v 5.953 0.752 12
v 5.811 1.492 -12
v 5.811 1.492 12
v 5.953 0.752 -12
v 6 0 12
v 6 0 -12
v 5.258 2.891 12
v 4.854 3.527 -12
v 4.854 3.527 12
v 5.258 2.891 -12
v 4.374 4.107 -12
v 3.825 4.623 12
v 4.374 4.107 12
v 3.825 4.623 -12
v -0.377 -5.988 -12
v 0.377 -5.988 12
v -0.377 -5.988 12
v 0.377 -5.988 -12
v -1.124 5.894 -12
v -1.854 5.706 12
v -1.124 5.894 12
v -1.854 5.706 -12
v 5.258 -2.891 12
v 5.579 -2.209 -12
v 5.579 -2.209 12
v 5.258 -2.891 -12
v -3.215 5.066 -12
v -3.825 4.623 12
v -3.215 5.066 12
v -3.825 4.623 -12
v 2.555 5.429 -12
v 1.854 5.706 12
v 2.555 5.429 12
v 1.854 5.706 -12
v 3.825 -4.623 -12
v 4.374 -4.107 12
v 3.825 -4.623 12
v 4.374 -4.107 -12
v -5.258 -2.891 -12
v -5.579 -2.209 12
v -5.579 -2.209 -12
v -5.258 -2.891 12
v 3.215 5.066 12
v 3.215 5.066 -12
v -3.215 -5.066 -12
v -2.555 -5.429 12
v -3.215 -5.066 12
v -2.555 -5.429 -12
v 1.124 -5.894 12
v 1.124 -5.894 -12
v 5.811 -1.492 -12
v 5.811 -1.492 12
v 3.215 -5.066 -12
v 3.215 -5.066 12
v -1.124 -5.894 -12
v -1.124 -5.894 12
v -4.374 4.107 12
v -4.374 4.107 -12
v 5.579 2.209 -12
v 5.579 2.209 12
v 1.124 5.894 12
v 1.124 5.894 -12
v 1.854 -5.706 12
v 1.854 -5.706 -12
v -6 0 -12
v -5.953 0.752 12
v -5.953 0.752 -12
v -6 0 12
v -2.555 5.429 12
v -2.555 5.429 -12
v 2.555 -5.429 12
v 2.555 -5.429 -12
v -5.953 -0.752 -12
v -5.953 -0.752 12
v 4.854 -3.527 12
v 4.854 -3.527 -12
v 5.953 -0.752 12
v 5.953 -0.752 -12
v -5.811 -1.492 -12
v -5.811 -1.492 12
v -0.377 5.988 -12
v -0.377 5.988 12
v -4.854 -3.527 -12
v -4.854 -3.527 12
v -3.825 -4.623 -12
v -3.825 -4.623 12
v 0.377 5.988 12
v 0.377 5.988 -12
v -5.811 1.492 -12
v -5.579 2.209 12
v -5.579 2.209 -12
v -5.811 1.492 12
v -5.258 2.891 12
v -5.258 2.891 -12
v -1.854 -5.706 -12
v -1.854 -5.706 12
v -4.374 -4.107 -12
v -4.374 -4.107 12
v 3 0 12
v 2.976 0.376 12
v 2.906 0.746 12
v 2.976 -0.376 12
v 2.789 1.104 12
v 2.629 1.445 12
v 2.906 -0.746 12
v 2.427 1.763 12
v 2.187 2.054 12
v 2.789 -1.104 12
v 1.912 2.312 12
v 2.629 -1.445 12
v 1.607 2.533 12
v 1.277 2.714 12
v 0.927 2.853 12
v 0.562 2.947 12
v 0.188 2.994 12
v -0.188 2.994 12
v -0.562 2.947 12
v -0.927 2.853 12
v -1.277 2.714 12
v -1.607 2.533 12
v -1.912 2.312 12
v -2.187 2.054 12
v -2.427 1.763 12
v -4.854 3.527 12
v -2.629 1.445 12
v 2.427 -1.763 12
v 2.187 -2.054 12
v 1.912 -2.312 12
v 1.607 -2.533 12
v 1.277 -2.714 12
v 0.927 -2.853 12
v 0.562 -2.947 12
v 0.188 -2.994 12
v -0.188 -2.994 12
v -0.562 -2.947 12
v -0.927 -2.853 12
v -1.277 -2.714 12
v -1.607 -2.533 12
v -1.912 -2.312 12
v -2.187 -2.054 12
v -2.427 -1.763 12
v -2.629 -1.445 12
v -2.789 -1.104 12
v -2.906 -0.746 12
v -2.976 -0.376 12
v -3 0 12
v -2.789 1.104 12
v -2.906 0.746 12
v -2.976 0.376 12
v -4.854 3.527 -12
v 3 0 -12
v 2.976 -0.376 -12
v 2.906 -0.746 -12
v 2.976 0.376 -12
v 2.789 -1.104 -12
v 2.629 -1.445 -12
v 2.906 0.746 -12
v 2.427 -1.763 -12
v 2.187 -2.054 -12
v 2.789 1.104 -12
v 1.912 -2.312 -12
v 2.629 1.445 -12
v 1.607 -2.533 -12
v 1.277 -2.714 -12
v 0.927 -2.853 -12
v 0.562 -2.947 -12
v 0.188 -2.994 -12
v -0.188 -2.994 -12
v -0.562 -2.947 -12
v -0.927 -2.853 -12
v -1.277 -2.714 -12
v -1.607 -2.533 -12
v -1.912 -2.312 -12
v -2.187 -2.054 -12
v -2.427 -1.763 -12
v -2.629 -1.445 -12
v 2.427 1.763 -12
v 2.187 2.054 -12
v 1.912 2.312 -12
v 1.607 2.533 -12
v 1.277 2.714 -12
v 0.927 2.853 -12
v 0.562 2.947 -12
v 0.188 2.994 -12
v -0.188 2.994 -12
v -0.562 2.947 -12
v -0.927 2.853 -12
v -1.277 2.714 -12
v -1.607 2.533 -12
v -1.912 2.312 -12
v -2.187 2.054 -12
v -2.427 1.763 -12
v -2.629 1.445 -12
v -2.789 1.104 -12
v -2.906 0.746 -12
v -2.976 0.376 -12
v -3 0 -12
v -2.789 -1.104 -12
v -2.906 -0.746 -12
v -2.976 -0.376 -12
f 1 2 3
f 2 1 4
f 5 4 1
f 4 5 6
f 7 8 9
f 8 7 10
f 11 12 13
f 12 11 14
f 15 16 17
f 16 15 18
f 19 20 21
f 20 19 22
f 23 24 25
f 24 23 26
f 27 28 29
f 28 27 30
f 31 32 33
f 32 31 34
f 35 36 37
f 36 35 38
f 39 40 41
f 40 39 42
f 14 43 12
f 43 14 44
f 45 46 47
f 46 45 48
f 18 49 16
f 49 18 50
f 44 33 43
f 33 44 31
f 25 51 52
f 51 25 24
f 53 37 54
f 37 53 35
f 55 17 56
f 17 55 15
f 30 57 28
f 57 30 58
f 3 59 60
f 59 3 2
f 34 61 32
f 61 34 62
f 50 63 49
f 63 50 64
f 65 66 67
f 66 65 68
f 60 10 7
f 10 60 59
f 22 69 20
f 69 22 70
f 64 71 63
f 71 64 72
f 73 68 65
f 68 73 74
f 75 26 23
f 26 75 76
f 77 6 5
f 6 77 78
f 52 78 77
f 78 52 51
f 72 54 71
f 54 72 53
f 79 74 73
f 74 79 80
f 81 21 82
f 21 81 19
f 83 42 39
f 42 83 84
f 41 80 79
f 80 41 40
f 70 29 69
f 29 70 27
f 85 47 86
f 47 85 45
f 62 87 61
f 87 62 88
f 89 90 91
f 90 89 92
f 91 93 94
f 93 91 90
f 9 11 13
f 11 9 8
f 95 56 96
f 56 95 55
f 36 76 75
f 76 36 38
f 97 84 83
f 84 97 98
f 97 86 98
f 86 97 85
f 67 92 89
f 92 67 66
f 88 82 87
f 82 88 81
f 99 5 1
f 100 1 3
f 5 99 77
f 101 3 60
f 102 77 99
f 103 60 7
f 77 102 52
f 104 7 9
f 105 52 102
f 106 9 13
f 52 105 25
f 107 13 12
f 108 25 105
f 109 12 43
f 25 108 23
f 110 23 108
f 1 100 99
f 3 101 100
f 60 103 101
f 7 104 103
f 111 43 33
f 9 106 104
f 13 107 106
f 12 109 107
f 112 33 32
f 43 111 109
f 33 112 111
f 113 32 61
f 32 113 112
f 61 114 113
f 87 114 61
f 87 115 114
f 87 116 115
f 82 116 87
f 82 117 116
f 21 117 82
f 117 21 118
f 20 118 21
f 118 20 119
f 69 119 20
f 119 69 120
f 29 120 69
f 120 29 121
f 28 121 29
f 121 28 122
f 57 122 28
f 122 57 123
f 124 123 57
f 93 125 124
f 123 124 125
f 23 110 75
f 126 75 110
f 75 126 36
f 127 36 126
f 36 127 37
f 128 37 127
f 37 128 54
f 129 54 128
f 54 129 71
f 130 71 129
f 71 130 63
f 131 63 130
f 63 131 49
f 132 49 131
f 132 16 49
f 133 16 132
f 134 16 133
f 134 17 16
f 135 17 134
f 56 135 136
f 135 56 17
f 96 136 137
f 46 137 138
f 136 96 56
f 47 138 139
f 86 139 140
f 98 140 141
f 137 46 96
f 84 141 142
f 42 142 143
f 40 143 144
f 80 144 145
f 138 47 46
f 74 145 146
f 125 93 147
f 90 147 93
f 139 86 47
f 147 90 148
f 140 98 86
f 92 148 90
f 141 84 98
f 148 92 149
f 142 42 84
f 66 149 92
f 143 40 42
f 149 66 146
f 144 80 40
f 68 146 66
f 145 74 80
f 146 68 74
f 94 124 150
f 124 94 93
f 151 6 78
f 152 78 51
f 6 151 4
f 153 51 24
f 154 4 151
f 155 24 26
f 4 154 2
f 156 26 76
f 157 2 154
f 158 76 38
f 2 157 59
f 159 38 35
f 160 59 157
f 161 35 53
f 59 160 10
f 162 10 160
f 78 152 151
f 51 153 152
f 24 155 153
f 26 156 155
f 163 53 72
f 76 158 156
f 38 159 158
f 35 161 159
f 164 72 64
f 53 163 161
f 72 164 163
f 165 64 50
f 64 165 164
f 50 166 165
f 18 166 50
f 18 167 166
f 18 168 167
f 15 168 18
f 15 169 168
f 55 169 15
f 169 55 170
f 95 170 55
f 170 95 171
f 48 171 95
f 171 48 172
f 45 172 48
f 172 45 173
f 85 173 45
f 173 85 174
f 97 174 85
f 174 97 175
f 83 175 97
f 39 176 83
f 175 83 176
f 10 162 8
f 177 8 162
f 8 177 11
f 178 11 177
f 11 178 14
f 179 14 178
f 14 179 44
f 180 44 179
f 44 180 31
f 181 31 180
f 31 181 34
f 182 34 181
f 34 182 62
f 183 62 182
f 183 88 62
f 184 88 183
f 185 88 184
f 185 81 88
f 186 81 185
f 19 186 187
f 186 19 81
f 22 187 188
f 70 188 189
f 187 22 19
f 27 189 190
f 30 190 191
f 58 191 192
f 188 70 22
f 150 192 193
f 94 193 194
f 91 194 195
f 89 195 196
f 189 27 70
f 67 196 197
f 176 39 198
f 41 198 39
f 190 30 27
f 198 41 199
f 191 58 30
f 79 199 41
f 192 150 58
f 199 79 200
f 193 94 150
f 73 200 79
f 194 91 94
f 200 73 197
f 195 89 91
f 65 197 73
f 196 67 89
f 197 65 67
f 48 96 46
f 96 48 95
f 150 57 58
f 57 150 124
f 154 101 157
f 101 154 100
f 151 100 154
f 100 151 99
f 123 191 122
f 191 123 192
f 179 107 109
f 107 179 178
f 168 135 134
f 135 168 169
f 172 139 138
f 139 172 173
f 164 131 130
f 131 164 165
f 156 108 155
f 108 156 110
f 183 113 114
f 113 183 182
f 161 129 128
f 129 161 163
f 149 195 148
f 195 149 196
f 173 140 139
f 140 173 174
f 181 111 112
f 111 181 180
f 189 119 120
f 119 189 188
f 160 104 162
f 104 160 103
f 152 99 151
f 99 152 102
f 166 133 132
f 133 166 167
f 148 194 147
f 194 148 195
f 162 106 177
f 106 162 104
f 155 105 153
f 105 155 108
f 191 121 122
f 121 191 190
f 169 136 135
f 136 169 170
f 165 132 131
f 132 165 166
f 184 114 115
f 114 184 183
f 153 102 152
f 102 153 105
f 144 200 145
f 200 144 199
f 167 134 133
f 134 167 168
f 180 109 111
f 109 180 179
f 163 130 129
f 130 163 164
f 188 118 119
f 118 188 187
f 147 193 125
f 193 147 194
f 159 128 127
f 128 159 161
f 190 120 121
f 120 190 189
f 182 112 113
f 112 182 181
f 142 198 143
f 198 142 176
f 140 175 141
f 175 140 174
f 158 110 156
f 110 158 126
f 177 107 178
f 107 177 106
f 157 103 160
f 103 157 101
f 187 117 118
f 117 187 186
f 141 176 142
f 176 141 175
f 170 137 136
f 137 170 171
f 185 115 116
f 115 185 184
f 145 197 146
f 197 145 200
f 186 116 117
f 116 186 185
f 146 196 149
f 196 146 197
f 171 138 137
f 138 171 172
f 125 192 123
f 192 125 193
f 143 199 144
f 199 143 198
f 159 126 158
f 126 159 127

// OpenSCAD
$fn = 50;


difference() {
	union() {
		translate(v = [0, 0, -12.0000000000]) {
			cylinder(h = 24, r = 6.0000000000);
		}
	}
	union() {
		translate(v = [0, 0, -100.0000000000]) {
			cylinder(h = 200, r = 3.0000000000);
		}
	}
}
